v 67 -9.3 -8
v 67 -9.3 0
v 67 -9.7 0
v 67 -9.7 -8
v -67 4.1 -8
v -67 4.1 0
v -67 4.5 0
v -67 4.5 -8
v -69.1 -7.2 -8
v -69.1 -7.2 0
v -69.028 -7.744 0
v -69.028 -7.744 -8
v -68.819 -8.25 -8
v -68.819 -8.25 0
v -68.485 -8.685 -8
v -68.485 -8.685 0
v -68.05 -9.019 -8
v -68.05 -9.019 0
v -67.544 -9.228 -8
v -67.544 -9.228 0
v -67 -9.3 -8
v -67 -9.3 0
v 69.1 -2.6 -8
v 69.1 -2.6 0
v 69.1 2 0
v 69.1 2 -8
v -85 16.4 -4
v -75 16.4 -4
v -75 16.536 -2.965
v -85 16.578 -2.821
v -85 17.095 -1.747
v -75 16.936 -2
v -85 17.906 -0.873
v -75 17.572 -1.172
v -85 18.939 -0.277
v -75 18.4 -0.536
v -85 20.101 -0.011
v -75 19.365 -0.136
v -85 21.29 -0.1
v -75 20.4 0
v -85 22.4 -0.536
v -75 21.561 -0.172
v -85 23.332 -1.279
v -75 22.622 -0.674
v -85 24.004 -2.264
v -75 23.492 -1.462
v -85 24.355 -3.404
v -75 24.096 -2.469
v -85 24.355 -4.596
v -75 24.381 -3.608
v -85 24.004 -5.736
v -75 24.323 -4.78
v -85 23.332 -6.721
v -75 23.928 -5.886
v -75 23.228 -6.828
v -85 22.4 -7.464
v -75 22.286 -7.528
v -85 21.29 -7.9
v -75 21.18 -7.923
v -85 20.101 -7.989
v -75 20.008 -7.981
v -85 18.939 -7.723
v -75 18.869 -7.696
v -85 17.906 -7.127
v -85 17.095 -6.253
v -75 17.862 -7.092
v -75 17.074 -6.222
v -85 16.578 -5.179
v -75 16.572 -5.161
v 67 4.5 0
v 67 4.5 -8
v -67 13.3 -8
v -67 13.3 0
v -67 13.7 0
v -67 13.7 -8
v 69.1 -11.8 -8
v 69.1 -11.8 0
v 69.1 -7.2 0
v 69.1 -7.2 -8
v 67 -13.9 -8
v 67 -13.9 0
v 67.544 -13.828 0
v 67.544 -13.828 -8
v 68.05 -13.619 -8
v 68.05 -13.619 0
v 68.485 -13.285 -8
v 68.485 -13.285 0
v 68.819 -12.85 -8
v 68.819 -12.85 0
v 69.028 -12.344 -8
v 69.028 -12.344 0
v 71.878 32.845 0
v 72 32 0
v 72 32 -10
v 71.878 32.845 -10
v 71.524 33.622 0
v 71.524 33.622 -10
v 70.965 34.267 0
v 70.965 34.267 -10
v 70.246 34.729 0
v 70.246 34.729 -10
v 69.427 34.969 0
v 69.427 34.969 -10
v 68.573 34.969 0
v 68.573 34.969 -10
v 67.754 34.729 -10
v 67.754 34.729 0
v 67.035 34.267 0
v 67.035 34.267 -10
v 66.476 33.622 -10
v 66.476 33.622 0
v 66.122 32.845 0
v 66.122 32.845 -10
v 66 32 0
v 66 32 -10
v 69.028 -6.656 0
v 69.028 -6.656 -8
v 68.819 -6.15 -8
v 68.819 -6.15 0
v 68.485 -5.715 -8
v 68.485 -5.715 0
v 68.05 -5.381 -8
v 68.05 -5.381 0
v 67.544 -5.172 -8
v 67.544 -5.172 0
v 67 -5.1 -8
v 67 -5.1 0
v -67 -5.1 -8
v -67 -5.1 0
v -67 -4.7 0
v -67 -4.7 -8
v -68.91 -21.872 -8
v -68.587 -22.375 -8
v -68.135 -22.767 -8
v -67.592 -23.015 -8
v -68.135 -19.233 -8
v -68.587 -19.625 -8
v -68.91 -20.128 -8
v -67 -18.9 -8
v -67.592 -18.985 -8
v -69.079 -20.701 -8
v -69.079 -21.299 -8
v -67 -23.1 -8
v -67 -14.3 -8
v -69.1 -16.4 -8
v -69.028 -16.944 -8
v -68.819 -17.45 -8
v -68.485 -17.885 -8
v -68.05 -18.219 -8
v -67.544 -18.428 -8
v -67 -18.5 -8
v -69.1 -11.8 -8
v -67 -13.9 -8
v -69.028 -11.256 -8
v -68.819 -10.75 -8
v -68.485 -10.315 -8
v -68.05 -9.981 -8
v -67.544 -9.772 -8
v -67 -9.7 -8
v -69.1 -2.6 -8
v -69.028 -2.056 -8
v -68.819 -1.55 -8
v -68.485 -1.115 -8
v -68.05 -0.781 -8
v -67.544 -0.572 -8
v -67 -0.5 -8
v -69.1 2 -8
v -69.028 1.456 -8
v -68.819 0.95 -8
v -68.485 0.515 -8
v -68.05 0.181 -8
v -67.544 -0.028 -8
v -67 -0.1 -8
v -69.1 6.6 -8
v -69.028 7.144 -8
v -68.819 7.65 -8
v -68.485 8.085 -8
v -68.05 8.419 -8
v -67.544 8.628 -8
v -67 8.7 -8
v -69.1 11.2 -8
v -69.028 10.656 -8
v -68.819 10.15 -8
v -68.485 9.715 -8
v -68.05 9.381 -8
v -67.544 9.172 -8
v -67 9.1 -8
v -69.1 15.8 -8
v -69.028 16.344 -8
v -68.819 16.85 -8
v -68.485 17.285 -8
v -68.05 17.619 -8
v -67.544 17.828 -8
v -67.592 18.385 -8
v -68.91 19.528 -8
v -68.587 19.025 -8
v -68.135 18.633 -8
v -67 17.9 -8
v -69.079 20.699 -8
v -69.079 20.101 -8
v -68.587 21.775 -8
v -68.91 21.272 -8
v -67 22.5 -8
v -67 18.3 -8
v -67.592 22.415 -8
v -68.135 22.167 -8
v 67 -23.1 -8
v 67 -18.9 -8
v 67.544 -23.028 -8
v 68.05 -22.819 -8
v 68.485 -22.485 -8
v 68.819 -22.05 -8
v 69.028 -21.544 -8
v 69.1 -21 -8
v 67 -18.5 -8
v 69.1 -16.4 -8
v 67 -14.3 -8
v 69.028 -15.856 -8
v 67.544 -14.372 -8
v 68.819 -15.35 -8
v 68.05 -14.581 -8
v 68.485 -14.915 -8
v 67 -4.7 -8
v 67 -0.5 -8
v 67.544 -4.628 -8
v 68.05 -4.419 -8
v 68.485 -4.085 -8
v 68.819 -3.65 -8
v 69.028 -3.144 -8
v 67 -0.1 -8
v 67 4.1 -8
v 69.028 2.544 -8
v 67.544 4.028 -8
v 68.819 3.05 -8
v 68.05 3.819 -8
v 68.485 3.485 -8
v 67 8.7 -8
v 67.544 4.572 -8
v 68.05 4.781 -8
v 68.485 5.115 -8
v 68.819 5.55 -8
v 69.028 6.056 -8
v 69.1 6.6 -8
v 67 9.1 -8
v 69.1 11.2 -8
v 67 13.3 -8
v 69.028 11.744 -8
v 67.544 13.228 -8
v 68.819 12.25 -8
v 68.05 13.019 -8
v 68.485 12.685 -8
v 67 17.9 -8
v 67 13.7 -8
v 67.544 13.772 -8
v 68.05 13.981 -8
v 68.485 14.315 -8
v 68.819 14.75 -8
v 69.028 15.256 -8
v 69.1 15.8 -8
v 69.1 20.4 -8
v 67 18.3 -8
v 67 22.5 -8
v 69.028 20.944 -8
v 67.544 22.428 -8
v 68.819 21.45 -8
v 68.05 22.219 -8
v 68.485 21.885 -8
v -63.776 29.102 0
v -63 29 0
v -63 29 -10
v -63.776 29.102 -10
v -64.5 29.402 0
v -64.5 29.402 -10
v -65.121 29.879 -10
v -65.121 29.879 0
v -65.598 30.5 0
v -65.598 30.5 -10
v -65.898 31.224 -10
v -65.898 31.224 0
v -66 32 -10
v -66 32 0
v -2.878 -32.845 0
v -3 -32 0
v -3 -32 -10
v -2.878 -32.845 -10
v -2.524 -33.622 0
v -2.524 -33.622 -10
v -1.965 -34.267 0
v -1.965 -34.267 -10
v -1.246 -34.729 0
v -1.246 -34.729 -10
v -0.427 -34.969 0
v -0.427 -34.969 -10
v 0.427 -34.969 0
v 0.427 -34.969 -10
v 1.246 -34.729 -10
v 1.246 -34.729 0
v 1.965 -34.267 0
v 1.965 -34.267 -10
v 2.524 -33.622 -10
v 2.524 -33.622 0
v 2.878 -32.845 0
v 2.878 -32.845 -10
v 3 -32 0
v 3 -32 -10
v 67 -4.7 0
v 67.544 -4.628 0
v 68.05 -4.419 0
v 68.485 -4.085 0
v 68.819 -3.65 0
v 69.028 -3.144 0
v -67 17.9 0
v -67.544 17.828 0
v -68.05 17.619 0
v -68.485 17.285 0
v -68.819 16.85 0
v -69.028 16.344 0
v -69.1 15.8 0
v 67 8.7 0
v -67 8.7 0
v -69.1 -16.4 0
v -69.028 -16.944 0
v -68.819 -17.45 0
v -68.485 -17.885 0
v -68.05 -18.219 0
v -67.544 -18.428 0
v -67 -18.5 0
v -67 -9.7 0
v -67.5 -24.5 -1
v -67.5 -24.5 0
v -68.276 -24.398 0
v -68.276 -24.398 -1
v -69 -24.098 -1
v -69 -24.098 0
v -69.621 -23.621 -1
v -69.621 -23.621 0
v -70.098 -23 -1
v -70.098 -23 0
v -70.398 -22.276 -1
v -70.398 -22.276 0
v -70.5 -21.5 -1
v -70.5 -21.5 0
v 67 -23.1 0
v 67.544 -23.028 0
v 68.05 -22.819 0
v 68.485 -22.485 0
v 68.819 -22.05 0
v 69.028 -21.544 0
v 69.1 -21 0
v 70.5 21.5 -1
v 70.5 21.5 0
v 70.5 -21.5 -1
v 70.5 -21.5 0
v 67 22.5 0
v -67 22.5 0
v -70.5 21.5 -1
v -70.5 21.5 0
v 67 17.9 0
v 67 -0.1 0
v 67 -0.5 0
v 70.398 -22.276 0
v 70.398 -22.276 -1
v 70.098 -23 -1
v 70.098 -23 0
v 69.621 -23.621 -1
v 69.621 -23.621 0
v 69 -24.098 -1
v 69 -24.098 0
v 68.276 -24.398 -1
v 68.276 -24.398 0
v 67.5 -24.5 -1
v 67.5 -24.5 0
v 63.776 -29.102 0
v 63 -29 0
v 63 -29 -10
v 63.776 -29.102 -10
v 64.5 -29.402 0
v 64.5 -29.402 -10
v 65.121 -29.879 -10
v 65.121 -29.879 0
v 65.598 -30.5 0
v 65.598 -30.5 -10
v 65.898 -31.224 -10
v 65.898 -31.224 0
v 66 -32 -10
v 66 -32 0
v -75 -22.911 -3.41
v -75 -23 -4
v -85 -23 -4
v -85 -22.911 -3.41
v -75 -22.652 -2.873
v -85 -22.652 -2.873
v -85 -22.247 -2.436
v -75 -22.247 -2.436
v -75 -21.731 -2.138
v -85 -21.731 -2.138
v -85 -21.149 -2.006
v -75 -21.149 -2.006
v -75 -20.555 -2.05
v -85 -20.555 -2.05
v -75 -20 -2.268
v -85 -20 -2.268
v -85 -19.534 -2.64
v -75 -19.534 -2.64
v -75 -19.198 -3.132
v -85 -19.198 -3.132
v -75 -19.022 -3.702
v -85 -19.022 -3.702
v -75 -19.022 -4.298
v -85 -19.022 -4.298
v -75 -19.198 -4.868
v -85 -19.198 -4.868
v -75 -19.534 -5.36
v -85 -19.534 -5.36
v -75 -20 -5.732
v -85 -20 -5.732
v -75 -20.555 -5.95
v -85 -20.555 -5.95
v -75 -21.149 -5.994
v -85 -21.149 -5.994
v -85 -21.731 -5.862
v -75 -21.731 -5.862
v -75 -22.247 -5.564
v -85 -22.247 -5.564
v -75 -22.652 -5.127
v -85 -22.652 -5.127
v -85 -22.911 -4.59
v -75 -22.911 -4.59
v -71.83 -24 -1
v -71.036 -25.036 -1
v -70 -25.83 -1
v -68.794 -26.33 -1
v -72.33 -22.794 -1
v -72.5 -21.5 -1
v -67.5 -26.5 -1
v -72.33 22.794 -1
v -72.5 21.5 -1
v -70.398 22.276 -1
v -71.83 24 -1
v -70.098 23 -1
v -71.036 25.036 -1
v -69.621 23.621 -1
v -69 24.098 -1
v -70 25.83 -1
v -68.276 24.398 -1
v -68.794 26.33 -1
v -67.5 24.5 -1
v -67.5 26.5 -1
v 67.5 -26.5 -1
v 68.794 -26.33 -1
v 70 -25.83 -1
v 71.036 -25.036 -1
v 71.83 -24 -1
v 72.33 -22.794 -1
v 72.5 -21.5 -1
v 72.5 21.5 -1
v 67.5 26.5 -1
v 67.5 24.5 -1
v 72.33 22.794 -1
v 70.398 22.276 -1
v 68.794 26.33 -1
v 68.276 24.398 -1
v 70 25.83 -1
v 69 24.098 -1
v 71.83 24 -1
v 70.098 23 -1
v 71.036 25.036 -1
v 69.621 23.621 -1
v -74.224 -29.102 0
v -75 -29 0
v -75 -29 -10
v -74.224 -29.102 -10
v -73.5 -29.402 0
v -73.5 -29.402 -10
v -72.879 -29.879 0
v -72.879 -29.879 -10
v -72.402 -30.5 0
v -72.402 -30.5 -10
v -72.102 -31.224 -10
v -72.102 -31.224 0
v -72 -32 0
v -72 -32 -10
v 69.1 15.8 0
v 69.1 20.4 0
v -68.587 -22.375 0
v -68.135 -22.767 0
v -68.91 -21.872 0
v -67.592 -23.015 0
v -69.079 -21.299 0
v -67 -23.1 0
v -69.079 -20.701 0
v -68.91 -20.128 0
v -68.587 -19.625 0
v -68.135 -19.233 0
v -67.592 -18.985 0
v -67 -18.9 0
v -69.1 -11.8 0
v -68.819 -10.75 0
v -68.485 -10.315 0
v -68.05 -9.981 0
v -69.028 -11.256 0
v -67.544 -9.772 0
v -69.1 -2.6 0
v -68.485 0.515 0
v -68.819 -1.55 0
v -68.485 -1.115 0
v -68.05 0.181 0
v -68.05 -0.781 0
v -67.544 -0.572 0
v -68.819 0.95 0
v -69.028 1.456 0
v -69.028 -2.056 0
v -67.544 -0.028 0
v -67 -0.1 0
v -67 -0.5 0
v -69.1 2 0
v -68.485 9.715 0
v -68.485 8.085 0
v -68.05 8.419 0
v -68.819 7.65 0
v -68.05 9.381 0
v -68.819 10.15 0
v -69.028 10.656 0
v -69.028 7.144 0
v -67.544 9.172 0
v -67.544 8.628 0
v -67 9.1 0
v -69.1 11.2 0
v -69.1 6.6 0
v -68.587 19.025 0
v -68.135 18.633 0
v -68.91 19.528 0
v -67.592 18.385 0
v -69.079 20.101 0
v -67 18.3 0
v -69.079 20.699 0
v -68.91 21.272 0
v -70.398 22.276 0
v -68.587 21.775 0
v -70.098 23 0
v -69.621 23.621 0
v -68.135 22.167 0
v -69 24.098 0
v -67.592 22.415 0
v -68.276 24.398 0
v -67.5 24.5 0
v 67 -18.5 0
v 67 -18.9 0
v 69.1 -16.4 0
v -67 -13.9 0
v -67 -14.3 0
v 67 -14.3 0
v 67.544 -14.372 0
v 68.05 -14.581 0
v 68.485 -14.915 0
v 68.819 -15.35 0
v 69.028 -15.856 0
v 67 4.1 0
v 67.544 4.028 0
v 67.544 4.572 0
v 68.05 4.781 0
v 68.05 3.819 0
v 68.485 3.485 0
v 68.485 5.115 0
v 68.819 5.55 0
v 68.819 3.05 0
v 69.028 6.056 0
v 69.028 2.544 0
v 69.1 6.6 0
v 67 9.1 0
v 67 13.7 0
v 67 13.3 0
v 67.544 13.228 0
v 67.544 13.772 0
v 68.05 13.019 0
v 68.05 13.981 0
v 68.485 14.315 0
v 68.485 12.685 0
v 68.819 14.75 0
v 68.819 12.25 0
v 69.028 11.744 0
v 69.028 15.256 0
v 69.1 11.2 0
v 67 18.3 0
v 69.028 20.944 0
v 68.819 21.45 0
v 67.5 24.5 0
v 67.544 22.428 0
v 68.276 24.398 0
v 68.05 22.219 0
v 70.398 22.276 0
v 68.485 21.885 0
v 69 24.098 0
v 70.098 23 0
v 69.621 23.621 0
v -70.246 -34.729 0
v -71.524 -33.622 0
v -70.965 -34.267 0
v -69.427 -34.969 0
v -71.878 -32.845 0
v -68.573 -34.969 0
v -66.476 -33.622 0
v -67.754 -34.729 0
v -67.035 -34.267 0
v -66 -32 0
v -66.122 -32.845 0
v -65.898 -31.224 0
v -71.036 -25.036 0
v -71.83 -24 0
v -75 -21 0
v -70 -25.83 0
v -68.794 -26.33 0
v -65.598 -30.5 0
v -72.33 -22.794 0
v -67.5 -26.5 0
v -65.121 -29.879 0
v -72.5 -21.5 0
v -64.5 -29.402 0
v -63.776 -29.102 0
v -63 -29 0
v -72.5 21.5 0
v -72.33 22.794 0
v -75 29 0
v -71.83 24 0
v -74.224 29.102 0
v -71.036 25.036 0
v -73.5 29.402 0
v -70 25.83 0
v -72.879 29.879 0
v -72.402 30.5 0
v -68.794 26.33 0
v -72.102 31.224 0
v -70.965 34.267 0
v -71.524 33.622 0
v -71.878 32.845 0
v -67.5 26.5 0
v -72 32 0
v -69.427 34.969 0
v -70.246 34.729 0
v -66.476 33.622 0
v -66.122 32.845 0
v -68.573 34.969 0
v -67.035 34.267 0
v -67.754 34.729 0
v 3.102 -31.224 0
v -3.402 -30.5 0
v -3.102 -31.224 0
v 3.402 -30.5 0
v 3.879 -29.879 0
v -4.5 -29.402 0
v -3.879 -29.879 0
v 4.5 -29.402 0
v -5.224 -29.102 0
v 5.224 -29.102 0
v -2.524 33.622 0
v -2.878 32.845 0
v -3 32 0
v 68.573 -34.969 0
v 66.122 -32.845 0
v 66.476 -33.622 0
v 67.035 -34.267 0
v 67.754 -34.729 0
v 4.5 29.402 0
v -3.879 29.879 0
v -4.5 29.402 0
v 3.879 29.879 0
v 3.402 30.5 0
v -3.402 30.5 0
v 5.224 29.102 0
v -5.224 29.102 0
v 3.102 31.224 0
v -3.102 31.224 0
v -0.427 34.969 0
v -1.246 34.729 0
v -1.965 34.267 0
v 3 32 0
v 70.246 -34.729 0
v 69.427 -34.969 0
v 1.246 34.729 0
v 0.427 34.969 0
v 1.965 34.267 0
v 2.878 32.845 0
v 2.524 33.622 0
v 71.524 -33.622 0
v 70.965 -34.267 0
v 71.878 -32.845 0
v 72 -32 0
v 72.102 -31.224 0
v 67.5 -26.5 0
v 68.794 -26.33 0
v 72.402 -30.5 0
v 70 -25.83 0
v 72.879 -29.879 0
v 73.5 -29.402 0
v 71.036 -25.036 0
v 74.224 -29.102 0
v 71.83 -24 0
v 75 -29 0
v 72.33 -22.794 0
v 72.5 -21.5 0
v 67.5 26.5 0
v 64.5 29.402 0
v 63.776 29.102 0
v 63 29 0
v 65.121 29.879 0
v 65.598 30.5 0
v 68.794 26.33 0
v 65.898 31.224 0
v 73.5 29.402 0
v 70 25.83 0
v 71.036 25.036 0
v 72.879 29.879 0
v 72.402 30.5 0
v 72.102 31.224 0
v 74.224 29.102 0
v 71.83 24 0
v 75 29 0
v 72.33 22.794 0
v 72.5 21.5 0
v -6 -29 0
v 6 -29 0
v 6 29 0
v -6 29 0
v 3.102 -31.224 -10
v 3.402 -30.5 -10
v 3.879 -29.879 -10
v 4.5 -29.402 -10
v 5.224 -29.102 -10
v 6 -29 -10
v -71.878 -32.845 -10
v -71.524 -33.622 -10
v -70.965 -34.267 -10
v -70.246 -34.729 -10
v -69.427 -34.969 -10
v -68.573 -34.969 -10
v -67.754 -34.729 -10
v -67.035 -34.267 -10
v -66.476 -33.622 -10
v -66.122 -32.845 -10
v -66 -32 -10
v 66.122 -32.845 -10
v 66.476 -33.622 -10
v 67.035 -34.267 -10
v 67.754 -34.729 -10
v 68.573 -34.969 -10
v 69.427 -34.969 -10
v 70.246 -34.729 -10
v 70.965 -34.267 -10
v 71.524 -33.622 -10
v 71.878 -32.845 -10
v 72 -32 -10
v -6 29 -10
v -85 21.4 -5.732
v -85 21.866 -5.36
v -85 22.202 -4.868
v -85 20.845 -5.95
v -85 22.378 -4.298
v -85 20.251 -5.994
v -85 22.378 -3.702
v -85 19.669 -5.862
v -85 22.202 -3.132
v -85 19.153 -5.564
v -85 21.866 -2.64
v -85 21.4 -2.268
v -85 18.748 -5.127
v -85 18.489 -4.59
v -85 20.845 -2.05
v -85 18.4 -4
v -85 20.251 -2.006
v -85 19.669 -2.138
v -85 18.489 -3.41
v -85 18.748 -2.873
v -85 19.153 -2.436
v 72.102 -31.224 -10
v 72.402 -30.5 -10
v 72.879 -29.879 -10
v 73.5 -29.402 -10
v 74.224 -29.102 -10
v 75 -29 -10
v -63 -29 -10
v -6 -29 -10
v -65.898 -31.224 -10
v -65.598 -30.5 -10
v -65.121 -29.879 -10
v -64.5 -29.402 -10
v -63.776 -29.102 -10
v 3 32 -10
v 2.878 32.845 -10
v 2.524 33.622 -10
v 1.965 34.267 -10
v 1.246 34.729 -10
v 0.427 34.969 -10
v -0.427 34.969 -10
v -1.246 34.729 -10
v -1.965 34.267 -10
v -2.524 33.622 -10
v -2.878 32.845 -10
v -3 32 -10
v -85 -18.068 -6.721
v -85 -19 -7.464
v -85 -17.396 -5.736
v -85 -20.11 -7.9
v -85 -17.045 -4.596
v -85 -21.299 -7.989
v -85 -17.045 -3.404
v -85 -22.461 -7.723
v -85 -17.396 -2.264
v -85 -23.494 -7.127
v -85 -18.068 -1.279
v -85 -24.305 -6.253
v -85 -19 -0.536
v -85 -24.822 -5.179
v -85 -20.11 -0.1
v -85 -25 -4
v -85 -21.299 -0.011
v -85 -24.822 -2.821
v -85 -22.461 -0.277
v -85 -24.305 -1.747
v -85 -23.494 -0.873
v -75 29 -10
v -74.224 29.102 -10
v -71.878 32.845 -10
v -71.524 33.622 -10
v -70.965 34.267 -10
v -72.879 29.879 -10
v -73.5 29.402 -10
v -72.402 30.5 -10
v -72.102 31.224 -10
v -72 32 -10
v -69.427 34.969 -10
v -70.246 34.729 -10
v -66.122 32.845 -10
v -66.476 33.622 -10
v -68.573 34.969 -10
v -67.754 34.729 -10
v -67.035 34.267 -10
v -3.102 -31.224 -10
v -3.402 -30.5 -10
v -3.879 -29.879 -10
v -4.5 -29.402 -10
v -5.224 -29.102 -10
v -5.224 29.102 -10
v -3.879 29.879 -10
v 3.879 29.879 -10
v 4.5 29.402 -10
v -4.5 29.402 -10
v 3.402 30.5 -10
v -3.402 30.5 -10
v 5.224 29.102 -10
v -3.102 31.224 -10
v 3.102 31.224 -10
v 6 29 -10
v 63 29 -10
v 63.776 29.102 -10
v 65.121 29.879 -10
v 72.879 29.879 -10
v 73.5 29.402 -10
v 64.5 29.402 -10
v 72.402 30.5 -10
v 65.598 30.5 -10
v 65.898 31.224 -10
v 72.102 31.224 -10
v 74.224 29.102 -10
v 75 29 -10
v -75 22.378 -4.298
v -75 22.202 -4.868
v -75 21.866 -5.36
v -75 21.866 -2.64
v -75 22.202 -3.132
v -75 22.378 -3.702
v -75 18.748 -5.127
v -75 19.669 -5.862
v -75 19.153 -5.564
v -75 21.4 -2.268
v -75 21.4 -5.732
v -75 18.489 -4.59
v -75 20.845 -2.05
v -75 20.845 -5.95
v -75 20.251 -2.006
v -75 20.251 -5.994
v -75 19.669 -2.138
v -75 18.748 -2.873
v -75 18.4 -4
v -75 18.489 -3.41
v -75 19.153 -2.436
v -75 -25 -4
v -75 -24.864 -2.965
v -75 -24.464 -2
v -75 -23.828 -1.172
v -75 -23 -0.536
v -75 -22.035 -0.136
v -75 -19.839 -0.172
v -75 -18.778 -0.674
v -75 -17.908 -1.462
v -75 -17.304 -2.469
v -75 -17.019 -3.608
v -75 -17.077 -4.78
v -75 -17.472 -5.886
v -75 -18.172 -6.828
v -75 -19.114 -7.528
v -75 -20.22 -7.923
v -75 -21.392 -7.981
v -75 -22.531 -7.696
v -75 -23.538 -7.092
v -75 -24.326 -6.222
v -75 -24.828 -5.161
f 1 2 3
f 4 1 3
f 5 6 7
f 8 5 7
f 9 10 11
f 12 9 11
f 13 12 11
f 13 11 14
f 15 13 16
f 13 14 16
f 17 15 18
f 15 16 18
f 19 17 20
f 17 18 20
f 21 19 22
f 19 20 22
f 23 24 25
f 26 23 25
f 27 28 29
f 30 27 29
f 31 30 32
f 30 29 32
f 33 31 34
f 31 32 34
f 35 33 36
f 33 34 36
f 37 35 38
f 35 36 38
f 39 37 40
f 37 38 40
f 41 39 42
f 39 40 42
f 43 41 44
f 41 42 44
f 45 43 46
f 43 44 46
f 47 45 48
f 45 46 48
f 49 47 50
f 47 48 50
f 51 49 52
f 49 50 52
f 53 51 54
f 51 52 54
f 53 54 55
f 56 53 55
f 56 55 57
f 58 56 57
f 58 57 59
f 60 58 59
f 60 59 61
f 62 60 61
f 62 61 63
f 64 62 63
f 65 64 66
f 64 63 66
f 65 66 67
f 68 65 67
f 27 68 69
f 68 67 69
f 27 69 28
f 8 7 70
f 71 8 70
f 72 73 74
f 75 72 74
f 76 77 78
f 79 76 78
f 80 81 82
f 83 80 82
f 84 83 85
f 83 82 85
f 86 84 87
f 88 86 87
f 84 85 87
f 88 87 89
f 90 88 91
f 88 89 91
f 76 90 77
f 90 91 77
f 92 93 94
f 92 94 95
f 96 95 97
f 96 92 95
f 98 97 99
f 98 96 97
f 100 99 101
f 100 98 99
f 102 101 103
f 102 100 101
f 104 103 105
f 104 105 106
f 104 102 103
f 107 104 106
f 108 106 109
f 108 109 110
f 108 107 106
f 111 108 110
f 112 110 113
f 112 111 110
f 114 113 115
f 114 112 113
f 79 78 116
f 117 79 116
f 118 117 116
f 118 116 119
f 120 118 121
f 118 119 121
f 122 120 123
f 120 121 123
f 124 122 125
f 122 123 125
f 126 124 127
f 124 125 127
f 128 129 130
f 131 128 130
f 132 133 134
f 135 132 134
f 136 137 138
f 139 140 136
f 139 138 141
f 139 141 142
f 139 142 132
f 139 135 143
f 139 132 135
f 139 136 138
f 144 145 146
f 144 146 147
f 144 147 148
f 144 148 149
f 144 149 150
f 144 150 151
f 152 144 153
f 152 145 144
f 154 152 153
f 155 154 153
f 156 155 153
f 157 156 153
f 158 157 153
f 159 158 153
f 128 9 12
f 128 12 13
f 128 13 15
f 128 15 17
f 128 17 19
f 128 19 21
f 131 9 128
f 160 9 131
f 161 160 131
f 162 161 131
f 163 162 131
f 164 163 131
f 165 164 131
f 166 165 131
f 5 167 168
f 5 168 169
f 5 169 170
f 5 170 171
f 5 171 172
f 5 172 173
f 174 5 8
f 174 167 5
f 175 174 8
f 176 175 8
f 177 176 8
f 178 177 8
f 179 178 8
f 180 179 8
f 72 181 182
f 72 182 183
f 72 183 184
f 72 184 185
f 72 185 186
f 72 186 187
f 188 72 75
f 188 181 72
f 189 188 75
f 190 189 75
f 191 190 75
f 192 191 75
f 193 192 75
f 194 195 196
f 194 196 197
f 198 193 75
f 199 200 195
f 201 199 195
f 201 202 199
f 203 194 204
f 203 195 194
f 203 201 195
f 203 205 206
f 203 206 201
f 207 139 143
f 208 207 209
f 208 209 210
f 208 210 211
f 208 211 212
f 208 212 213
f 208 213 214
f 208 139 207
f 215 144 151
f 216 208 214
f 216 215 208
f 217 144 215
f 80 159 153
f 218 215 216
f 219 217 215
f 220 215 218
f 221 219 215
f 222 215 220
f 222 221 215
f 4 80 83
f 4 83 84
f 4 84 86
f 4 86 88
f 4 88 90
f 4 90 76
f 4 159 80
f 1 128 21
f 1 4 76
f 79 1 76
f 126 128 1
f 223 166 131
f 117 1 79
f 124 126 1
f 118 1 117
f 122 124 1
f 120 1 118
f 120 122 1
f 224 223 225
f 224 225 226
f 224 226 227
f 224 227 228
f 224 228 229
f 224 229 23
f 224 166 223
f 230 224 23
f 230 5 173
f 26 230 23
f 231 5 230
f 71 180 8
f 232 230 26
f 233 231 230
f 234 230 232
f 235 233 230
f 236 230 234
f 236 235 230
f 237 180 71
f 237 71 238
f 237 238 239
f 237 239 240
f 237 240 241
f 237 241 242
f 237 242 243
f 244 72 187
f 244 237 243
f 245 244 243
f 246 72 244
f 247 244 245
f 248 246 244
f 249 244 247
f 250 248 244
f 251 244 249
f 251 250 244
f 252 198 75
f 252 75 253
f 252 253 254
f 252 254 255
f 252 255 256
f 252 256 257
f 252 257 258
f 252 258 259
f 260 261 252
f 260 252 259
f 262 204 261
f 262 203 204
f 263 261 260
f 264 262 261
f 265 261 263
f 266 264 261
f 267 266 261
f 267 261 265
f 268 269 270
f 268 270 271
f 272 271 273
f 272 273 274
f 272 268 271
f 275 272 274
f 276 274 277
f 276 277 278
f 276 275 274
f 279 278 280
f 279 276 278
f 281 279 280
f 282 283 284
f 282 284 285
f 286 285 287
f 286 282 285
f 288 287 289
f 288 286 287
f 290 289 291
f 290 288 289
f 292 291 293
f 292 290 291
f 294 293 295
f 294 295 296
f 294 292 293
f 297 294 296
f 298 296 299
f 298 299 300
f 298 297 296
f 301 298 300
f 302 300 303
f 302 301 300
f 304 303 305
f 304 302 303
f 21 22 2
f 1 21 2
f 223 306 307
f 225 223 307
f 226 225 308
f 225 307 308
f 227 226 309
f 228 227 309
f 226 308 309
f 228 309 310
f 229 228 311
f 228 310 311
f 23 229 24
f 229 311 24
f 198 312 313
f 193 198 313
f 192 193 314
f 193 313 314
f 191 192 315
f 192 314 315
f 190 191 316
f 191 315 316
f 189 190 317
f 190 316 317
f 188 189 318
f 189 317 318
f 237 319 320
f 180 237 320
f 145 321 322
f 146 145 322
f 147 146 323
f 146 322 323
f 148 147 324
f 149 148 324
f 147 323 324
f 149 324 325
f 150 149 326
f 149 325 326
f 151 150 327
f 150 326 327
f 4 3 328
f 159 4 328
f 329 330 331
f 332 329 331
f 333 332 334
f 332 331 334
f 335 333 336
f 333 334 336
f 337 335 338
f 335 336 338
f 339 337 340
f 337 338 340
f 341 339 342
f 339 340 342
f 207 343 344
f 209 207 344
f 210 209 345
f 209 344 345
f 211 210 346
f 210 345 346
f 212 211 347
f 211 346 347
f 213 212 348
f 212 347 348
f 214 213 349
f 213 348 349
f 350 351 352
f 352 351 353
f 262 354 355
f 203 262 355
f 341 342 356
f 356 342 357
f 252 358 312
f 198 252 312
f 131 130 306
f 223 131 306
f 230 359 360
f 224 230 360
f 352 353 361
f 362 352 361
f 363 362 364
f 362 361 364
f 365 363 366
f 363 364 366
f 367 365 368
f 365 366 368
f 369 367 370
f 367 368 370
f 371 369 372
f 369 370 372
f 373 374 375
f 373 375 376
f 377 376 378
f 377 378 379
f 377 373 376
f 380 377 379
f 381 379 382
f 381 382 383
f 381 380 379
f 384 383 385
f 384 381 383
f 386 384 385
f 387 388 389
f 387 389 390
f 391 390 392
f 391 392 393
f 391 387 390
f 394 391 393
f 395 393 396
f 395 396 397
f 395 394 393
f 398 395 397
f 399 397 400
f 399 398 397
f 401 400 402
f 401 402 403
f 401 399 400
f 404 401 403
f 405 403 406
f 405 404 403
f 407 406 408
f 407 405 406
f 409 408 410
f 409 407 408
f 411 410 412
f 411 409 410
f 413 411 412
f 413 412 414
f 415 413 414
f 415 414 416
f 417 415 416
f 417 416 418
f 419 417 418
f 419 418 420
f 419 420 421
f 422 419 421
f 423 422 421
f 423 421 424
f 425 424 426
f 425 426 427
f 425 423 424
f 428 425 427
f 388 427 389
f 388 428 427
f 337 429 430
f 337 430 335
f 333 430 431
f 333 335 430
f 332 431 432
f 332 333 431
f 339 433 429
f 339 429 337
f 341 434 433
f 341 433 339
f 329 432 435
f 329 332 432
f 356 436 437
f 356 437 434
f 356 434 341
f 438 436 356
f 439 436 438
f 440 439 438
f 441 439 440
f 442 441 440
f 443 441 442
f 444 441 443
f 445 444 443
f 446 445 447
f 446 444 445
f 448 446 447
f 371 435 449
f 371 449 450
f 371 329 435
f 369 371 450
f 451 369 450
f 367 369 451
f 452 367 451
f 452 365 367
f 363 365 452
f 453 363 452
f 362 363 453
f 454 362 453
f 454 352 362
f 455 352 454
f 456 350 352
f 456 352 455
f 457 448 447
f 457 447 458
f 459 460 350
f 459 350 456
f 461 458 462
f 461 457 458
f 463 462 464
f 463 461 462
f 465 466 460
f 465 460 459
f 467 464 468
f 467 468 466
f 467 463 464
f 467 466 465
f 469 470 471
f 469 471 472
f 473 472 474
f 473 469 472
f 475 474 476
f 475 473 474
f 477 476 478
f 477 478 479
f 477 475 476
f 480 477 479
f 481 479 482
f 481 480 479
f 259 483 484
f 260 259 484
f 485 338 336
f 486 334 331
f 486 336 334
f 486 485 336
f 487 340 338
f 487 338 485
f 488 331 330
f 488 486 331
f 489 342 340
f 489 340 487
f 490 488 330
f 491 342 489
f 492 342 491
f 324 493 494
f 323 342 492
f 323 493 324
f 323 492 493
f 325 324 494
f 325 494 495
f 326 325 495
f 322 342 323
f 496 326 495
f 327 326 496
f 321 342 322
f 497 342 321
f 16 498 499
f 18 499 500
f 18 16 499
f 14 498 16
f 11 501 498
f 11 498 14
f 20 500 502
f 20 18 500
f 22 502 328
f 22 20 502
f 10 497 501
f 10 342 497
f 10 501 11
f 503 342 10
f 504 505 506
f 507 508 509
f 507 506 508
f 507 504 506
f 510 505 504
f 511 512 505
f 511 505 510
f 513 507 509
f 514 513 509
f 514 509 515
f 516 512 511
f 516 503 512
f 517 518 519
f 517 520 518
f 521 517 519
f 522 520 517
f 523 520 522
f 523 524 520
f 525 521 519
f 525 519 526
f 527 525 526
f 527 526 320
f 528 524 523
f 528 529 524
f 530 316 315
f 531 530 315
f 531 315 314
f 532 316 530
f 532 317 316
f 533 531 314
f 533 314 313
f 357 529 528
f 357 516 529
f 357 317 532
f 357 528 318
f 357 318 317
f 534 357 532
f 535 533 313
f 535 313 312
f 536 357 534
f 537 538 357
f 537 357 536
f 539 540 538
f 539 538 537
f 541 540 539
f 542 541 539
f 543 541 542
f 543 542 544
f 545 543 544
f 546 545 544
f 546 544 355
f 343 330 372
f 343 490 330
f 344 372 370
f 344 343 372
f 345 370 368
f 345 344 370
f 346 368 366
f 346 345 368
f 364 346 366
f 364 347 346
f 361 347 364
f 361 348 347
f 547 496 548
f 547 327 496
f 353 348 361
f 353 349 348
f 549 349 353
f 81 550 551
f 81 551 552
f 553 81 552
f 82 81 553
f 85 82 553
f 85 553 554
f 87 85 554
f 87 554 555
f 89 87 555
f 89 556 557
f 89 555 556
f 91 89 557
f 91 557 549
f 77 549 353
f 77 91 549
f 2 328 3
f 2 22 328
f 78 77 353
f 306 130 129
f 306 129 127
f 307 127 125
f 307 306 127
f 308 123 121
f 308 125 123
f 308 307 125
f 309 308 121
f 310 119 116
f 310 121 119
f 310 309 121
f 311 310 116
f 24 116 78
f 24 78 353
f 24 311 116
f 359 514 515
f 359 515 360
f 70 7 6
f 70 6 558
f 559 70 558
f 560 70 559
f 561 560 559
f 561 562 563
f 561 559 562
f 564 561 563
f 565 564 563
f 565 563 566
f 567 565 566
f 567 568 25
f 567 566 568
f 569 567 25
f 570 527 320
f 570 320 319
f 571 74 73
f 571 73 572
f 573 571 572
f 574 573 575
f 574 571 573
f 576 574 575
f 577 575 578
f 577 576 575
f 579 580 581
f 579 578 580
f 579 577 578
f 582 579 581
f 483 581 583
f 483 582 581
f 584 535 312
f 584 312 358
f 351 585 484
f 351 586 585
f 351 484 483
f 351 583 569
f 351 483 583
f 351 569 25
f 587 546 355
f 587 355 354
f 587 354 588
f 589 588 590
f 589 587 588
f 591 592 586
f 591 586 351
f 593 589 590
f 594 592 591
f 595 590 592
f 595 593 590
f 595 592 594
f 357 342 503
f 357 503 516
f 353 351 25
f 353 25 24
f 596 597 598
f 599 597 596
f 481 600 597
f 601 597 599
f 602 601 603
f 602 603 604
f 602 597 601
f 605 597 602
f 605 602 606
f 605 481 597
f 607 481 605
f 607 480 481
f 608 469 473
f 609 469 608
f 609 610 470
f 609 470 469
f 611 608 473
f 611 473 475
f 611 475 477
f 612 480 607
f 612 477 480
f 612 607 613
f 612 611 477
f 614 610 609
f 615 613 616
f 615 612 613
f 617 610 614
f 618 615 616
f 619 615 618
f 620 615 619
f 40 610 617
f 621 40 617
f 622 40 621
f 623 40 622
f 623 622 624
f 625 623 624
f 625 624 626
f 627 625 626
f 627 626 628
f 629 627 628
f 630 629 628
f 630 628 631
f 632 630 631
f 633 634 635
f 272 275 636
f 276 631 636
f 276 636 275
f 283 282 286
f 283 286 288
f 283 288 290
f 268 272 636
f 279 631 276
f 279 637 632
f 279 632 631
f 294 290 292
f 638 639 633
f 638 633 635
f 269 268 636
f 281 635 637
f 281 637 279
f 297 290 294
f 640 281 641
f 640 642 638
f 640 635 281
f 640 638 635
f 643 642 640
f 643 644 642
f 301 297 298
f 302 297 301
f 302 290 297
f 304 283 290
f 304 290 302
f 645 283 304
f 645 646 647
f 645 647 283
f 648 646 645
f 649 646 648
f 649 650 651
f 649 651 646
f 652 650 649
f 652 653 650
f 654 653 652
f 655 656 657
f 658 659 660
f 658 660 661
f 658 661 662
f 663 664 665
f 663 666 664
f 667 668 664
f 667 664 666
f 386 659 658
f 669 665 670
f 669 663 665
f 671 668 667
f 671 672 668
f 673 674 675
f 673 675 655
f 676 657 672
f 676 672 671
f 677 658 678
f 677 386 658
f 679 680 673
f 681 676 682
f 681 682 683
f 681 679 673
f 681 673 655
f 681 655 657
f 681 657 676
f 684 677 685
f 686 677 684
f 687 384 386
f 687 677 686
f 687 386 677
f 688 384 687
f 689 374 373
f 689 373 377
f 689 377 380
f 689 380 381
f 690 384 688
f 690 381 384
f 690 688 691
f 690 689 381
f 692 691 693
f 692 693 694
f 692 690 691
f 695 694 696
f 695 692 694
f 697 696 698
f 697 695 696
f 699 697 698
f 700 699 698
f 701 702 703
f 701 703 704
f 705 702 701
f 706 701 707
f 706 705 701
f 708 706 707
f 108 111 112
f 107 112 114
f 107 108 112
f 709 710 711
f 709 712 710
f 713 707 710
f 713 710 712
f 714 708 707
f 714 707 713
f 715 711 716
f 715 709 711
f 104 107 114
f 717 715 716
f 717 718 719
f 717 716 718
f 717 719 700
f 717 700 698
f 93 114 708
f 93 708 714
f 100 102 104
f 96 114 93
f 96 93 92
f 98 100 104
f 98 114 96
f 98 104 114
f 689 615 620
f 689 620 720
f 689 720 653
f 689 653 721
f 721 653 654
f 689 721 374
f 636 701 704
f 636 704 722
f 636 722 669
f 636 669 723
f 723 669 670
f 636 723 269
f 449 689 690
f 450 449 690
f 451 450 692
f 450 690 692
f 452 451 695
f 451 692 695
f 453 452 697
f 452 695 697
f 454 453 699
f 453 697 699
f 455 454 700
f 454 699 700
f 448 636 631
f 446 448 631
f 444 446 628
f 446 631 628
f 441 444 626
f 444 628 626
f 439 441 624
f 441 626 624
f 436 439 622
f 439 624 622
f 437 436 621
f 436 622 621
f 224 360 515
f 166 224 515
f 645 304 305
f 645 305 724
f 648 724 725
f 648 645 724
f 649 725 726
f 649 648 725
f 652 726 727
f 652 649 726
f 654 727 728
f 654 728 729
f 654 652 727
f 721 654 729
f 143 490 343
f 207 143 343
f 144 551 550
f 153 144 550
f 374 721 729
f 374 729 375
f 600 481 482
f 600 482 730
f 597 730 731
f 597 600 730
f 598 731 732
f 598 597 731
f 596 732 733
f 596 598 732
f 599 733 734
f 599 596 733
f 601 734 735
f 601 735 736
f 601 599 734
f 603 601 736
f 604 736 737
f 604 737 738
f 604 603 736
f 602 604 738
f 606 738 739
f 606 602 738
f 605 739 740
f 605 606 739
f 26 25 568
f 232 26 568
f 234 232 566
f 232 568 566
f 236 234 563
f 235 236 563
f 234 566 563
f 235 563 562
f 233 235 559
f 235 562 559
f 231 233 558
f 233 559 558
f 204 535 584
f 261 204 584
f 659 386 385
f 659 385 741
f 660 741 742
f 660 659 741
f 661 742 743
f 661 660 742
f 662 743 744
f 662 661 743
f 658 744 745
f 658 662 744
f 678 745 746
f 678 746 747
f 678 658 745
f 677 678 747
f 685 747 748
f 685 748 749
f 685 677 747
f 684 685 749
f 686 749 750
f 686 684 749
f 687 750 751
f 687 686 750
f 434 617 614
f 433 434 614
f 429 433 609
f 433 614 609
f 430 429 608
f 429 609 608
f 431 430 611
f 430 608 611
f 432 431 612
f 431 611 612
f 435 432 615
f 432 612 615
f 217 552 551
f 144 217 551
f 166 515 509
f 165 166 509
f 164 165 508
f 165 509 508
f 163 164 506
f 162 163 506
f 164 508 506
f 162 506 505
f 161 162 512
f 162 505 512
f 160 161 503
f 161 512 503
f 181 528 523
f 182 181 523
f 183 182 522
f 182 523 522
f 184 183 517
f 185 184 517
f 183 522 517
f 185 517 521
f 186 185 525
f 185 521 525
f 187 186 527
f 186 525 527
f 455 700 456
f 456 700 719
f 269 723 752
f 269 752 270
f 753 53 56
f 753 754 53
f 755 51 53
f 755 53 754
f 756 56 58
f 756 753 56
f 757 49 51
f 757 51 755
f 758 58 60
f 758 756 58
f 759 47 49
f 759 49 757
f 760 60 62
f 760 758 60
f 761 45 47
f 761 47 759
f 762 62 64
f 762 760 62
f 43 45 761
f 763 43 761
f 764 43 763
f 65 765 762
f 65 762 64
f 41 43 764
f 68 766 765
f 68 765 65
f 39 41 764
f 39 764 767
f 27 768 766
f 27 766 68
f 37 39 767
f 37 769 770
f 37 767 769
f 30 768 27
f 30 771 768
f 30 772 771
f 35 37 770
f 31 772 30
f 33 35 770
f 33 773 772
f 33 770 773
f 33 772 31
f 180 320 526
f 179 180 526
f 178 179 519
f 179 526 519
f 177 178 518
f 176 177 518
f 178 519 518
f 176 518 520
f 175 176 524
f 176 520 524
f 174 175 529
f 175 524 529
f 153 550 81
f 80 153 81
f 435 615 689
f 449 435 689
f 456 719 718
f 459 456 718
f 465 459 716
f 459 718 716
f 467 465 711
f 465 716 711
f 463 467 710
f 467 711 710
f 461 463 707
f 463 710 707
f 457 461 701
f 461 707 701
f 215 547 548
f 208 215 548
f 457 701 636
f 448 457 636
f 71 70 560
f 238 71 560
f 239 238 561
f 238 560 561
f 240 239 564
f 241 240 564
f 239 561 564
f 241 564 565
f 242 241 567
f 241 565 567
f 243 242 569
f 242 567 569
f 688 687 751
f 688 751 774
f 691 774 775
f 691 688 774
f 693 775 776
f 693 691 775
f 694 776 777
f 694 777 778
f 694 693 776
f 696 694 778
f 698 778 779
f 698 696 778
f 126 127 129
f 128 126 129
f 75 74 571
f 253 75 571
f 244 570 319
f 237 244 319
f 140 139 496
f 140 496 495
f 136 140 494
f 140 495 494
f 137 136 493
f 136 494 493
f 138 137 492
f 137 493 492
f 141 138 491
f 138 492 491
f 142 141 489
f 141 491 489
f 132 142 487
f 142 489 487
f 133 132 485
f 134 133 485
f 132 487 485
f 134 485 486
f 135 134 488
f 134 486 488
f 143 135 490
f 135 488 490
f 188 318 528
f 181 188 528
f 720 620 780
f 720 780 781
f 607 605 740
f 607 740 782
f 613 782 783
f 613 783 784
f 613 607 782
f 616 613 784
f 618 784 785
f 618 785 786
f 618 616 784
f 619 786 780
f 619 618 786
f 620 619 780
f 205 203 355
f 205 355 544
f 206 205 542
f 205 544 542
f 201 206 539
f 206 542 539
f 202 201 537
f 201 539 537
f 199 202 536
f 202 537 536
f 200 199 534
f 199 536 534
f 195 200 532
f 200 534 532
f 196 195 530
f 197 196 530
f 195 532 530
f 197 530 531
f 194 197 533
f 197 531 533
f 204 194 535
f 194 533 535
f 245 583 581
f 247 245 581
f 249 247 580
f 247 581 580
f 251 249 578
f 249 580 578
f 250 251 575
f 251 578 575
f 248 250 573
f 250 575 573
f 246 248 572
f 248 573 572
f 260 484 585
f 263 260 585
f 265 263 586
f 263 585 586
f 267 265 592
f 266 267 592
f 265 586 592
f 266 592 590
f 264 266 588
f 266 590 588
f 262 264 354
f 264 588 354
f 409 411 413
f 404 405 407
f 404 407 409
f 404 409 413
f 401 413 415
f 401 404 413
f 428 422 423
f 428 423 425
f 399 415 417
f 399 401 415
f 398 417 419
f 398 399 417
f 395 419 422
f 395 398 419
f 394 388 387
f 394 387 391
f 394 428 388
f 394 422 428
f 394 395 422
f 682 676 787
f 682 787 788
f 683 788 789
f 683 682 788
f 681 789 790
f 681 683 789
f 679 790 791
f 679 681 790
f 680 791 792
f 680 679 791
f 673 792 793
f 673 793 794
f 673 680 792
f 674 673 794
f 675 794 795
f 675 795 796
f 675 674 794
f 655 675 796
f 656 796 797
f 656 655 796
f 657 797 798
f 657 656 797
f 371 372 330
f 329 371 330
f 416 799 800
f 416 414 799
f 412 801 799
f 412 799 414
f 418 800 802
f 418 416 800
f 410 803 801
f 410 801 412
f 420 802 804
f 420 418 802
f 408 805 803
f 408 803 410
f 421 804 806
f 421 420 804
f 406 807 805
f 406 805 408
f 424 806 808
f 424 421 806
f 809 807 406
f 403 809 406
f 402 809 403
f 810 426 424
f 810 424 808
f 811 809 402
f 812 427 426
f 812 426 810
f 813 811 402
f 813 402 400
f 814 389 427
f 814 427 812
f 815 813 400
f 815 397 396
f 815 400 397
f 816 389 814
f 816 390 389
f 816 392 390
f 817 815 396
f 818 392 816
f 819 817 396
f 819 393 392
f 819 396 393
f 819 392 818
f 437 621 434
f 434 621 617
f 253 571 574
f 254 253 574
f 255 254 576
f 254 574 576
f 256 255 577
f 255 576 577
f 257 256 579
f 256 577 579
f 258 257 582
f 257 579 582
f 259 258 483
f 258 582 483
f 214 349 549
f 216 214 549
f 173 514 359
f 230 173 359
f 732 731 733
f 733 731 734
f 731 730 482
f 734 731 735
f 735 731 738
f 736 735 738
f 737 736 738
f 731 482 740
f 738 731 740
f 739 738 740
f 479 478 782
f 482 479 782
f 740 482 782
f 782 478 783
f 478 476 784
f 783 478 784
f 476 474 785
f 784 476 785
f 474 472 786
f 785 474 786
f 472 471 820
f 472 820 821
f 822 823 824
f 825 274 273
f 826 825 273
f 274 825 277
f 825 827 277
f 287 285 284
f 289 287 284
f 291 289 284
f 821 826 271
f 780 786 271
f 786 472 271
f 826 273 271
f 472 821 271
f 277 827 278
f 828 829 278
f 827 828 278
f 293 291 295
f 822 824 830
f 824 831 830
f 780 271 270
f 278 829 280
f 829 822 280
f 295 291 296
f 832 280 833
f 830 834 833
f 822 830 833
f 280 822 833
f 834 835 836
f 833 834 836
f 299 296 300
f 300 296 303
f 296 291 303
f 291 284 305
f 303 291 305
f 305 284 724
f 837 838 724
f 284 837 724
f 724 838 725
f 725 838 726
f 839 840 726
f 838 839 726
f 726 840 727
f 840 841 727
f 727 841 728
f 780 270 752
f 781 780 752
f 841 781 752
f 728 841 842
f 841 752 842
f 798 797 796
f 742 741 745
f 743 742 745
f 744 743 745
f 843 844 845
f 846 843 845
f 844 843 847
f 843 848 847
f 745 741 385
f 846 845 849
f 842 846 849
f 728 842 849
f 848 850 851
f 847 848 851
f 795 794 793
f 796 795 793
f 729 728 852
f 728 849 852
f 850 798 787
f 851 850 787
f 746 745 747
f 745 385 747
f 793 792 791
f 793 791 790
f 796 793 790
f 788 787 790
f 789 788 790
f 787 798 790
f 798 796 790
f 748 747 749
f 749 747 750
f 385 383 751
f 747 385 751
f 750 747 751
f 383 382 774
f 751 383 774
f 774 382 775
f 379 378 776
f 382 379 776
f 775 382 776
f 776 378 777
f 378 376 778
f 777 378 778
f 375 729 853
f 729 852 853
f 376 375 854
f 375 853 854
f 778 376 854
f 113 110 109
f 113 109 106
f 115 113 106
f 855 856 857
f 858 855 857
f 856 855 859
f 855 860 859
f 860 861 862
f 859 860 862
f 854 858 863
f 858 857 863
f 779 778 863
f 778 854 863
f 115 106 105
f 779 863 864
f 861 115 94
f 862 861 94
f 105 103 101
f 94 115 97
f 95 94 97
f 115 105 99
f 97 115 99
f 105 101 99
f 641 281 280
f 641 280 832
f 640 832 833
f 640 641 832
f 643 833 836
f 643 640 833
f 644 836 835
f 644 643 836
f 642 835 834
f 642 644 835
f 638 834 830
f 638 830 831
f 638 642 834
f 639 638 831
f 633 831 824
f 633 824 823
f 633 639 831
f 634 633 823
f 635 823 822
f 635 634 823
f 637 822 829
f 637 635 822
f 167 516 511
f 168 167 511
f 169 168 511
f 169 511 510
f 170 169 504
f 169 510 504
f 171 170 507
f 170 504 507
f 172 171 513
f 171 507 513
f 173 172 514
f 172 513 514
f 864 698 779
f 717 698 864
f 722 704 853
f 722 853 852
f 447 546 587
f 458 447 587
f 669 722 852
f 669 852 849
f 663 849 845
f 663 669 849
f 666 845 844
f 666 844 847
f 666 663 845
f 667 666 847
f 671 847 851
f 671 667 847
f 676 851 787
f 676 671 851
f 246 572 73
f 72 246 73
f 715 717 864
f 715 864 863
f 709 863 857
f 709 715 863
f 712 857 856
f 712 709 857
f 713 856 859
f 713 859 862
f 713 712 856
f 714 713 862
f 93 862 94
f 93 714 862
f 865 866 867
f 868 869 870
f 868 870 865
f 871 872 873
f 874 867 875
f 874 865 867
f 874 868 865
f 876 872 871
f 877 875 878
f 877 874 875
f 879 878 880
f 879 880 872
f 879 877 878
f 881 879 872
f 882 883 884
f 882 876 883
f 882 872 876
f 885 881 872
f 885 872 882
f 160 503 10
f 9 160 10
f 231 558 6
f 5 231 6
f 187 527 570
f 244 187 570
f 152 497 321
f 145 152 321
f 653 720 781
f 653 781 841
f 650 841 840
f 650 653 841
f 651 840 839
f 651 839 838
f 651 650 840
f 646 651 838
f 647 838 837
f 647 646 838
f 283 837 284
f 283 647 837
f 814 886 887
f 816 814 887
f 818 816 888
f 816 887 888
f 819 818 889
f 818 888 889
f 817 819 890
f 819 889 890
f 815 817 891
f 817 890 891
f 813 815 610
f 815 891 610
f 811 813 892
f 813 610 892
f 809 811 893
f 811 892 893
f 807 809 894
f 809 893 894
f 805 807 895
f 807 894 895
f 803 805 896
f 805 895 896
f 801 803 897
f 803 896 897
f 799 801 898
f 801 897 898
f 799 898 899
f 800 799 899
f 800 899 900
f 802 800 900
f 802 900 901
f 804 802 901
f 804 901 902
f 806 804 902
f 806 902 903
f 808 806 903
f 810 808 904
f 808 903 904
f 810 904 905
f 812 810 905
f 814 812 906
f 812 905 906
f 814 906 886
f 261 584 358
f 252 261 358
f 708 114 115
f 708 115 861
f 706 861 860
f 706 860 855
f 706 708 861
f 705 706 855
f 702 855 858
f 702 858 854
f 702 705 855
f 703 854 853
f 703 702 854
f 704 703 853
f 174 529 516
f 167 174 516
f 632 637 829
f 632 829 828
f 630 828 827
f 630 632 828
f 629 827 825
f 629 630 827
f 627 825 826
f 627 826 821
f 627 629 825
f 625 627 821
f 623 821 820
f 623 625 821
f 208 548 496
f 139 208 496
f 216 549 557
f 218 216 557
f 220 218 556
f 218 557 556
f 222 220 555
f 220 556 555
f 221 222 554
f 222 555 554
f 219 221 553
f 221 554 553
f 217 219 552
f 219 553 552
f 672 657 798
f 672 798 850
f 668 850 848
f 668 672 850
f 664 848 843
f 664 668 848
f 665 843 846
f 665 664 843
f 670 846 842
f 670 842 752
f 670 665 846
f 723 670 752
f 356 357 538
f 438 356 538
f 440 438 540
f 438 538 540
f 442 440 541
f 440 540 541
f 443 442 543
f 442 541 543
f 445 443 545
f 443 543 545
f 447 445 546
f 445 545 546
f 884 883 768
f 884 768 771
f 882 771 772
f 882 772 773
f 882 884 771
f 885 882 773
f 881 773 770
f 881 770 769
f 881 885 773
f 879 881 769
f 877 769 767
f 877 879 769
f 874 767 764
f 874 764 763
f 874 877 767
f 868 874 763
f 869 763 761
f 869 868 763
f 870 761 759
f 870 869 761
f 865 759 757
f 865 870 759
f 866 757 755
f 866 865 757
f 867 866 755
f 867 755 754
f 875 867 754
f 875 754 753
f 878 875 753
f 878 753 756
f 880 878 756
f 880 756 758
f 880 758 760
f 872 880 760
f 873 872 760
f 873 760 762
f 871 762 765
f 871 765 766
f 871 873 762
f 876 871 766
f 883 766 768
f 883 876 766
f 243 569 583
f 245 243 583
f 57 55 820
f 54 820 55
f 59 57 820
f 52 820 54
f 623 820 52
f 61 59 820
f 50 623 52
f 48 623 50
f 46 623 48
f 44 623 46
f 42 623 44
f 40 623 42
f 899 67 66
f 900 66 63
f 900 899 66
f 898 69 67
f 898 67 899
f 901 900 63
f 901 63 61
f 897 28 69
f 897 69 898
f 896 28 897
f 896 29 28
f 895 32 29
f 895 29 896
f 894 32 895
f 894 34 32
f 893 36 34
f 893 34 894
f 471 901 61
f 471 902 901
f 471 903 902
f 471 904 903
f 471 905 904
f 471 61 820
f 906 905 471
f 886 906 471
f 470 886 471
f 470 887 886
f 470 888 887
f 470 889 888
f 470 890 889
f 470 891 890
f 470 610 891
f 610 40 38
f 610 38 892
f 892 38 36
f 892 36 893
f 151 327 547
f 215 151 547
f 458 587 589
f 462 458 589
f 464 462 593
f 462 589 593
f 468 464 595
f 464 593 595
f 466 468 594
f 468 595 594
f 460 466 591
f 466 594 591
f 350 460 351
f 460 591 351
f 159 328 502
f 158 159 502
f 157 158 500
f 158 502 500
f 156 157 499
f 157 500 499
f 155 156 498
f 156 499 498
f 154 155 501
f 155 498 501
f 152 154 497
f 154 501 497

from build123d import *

# Parameters (mm, degrees)
F1_DEPTH = 10
F3_DEPTH = 1
F5_DEPTH = 8
F6_R     = 4
F6_R_2   = 2
F7_DEPTH = 10


with BuildPart() as f1:
    # F0 (on Top) → F1 (new body)
    with BuildSketch(Plane.XY):
        with BuildLine():
            ThreePointArc((66, 32), (65.12132, 29.87868), (63, 29))
            Line((63, 29), (6, 29))
            ThreePointArc((6, 29), (3.87868, 29.87868), (3, 32))
            ThreePointArc((3, 32), (0, 35), (-3, 32))
            ThreePointArc((-3, 32), (-3.87868, 29.87868), (-6, 29))
            Line((-6, 29), (-63, 29))
            ThreePointArc((-63, 29), (-65.12132, 29.87868), (-66, 32))
            ThreePointArc((-66, 32), (-69, 35), (-72, 32))
            ThreePointArc((-72, 32), (-72.87868, 29.87868), (-75, 29))
            Line((-75, 29), (-75, -29))
            ThreePointArc((-75, -29), (-72.87868, -29.87868), (-72, -32))
            ThreePointArc((-72, -32), (-69, -35), (-66, -32))
            ThreePointArc((-66, -32), (-65.12132, -29.87868), (-63, -29))
            Line((-63, -29), (-6, -29))
            ThreePointArc((-6, -29), (-3.87868, -29.87868), (-3, -32))
            ThreePointArc((-3, -32), (0, -35), (3, -32))
            ThreePointArc((3, -32), (3.87868, -29.87868), (6, -29))
            Line((6, -29), (63, -29))
            ThreePointArc((63, -29), (65.12132, -29.87868), (66, -32))
            ThreePointArc((66, -32), (69, -35), (72, -32))
            ThreePointArc((72, -32), (72.87868, -29.87868), (75, -29))
            Line((75, -29), (75, 29))
            ThreePointArc((75, 29), (72.87868, 29.87868), (72, 32))
            ThreePointArc((72, 32), (69, 35), (66, 32))
        make_face()
    extrude(amount=-F1_DEPTH)

    # F2 (on face) → F3 (cut)
    with BuildSketch(Plane.XY):
        with BuildLine():
            ThreePointArc((72.5, 21.5), (71.035534, 25.035534), (67.5, 26.5))
            Line((67.5, 26.5), (-67.5, 26.5))
            ThreePointArc((-67.5, 26.5), (-71.035534, 25.035534), (-72.5, 21.5))
            Line((-72.5, 21.5), (-72.5, -21.5))
            ThreePointArc((-72.5, -21.5), (-71.035534, -25.035534), (-67.5, -26.5))
            Line((-67.5, -26.5), (67.5, -26.5))
            ThreePointArc((67.5, -26.5), (71.035534, -25.035534), (72.5, -21.5))
            Line((72.5, -21.5), (72.5, 21.5))
        make_face()
        with BuildLine():
            Line((-67.5, 24.5), (67.5, 24.5))
            ThreePointArc((67.5, 24.5), (69.62132, 23.62132), (70.5, 21.5))
            Line((70.5, 21.5), (70.5, -21.5))
            ThreePointArc((70.5, -21.5), (69.62132, -23.62132), (67.5, -24.5))
            Line((67.5, -24.5), (-67.5, -24.5))
            ThreePointArc((-67.5, -24.5), (-69.62132, -23.62132), (-70.5, -21.5))
            Line((-70.5, -21.5), (-70.5, 21.5))
            ThreePointArc((-70.5, 21.5), (-69.62132, 23.62132), (-67.5, 24.5))
        make_face(mode=Mode.SUBTRACT)
    extrude(amount=-F3_DEPTH, mode=Mode.SUBTRACT)

    # F4 (on face) → F5 (cut)
    with BuildSketch(Plane.XY):
        with BuildLine():
            Line((67, -18.9), (-67, -18.9))
            ThreePointArc((-67, -18.9), (-69.1, -21), (-67, -23.1))
            Line((-67, -23.1), (67, -23.1))
            ThreePointArc((67, -23.1), (68.484924, -22.484924), (69.1, -21))
            Line((69.1, -21), (69.1, -16.4))
            ThreePointArc((69.1, -16.4), (68.484924, -14.915076), (67, -14.3))
            Line((67, -14.3), (-67, -14.3))
            Line((-67, -14.3), (-67, -13.9))
            Line((-67, -13.9), (67, -13.9))
            ThreePointArc((67, -13.9), (68.484924, -13.284924), (69.1, -11.8))
            Line((69.1, -11.8), (69.1, -7.2))
            ThreePointArc((69.1, -7.2), (68.484924, -5.715076), (67, -5.1))
            Line((67, -5.1), (-67, -5.1))
            Line((-67, -5.1), (-67, -4.7))
            Line((-67, -4.7), (67, -4.7))
            ThreePointArc((67, -4.7), (68.484924, -4.084924), (69.1, -2.6))
            Line((69.1, -2.6), (69.1, 2))
            ThreePointArc((69.1, 2), (68.484924, 3.484924), (67, 4.1))
            Line((67, 4.1), (-67, 4.1))
            Line((-67, 4.1), (-67, 4.5))
            Line((-67, 4.5), (67, 4.5))
            ThreePointArc((67, 4.5), (68.484924, 5.115076), (69.1, 6.6))
            Line((69.1, 6.6), (69.1, 11.2))
            ThreePointArc((69.1, 11.2), (68.484924, 12.684924), (67, 13.3))
            Line((67, 13.3), (-67, 13.3))
            Line((-67, 13.3), (-67, 13.7))
            Line((-67, 13.7), (67, 13.7))
            ThreePointArc((67, 13.7), (68.484924, 14.315076), (69.1, 15.8))
            Line((69.1, 15.8), (69.1, 20.4))
            ThreePointArc((69.1, 20.4), (68.484924, 21.884924), (67, 22.5))
            Line((67, 22.5), (-67, 22.5))
            ThreePointArc((-67, 22.5), (-69.1, 20.4), (-67, 18.3))
            Line((-67, 18.3), (67, 18.3))
            Line((67, 18.3), (67, 17.9))
            Line((67, 17.9), (-67, 17.9))
            ThreePointArc((-67, 17.9), (-68.484924, 17.284924), (-69.1, 15.8))
            Line((-69.1, 15.8), (-69.1, 11.2))
            ThreePointArc((-69.1, 11.2), (-68.484924, 9.715076), (-67, 9.1))
            Line((-67, 9.1), (67, 9.1))
            Line((67, 9.1), (67, 8.7))
            Line((67, 8.7), (-67, 8.7))
            ThreePointArc((-67, 8.7), (-68.484924, 8.084924), (-69.1, 6.6))
            Line((-69.1, 6.6), (-69.1, 2))
            ThreePointArc((-69.1, 2), (-68.484924, 0.515076), (-67, -0.1))
            Line((-67, -0.1), (67, -0.1))
            Line((67, -0.1), (67, -0.5))
            Line((67, -0.5), (-67, -0.5))
            ThreePointArc((-67, -0.5), (-68.484924, -1.115076), (-69.1, -2.6))
            Line((-69.1, -2.6), (-69.1, -7.2))
            ThreePointArc((-69.1, -7.2), (-68.484924, -8.684924), (-67, -9.3))
            Line((-67, -9.3), (67, -9.3))
            Line((67, -9.3), (67, -9.7))
            Line((67, -9.7), (-67, -9.7))
            ThreePointArc((-67, -9.7), (-68.484924, -10.315076), (-69.1, -11.8))
            Line((-69.1, -11.8), (-69.1, -16.4))
            ThreePointArc((-69.1, -16.4), (-68.484924, -17.884924), (-67, -18.5))
            Line((-67, -18.5), (67, -18.5))
            Line((67, -18.5), (67, -18.9))
        make_face()
    extrude(amount=-F5_DEPTH, mode=Mode.SUBTRACT)

    # F6 (on face) → F7 (join)
    with BuildSketch(Plane(origin=(-75, 0, 0), x_dir=(0, -1, 0), z_dir=(-1, 0, 0))):
        with Locations((-20.4, -4)):
            Circle(F6_R)
        with Locations((-20.4, -4)):
            Circle(F6_R_2, mode=Mode.SUBTRACT)
        with Locations((21, -4)):
            Circle(F6_R)
        with Locations((21, -4)):
            Circle(F6_R_2, mode=Mode.SUBTRACT)
    extrude(amount=F7_DEPTH)


solid = f1.part
